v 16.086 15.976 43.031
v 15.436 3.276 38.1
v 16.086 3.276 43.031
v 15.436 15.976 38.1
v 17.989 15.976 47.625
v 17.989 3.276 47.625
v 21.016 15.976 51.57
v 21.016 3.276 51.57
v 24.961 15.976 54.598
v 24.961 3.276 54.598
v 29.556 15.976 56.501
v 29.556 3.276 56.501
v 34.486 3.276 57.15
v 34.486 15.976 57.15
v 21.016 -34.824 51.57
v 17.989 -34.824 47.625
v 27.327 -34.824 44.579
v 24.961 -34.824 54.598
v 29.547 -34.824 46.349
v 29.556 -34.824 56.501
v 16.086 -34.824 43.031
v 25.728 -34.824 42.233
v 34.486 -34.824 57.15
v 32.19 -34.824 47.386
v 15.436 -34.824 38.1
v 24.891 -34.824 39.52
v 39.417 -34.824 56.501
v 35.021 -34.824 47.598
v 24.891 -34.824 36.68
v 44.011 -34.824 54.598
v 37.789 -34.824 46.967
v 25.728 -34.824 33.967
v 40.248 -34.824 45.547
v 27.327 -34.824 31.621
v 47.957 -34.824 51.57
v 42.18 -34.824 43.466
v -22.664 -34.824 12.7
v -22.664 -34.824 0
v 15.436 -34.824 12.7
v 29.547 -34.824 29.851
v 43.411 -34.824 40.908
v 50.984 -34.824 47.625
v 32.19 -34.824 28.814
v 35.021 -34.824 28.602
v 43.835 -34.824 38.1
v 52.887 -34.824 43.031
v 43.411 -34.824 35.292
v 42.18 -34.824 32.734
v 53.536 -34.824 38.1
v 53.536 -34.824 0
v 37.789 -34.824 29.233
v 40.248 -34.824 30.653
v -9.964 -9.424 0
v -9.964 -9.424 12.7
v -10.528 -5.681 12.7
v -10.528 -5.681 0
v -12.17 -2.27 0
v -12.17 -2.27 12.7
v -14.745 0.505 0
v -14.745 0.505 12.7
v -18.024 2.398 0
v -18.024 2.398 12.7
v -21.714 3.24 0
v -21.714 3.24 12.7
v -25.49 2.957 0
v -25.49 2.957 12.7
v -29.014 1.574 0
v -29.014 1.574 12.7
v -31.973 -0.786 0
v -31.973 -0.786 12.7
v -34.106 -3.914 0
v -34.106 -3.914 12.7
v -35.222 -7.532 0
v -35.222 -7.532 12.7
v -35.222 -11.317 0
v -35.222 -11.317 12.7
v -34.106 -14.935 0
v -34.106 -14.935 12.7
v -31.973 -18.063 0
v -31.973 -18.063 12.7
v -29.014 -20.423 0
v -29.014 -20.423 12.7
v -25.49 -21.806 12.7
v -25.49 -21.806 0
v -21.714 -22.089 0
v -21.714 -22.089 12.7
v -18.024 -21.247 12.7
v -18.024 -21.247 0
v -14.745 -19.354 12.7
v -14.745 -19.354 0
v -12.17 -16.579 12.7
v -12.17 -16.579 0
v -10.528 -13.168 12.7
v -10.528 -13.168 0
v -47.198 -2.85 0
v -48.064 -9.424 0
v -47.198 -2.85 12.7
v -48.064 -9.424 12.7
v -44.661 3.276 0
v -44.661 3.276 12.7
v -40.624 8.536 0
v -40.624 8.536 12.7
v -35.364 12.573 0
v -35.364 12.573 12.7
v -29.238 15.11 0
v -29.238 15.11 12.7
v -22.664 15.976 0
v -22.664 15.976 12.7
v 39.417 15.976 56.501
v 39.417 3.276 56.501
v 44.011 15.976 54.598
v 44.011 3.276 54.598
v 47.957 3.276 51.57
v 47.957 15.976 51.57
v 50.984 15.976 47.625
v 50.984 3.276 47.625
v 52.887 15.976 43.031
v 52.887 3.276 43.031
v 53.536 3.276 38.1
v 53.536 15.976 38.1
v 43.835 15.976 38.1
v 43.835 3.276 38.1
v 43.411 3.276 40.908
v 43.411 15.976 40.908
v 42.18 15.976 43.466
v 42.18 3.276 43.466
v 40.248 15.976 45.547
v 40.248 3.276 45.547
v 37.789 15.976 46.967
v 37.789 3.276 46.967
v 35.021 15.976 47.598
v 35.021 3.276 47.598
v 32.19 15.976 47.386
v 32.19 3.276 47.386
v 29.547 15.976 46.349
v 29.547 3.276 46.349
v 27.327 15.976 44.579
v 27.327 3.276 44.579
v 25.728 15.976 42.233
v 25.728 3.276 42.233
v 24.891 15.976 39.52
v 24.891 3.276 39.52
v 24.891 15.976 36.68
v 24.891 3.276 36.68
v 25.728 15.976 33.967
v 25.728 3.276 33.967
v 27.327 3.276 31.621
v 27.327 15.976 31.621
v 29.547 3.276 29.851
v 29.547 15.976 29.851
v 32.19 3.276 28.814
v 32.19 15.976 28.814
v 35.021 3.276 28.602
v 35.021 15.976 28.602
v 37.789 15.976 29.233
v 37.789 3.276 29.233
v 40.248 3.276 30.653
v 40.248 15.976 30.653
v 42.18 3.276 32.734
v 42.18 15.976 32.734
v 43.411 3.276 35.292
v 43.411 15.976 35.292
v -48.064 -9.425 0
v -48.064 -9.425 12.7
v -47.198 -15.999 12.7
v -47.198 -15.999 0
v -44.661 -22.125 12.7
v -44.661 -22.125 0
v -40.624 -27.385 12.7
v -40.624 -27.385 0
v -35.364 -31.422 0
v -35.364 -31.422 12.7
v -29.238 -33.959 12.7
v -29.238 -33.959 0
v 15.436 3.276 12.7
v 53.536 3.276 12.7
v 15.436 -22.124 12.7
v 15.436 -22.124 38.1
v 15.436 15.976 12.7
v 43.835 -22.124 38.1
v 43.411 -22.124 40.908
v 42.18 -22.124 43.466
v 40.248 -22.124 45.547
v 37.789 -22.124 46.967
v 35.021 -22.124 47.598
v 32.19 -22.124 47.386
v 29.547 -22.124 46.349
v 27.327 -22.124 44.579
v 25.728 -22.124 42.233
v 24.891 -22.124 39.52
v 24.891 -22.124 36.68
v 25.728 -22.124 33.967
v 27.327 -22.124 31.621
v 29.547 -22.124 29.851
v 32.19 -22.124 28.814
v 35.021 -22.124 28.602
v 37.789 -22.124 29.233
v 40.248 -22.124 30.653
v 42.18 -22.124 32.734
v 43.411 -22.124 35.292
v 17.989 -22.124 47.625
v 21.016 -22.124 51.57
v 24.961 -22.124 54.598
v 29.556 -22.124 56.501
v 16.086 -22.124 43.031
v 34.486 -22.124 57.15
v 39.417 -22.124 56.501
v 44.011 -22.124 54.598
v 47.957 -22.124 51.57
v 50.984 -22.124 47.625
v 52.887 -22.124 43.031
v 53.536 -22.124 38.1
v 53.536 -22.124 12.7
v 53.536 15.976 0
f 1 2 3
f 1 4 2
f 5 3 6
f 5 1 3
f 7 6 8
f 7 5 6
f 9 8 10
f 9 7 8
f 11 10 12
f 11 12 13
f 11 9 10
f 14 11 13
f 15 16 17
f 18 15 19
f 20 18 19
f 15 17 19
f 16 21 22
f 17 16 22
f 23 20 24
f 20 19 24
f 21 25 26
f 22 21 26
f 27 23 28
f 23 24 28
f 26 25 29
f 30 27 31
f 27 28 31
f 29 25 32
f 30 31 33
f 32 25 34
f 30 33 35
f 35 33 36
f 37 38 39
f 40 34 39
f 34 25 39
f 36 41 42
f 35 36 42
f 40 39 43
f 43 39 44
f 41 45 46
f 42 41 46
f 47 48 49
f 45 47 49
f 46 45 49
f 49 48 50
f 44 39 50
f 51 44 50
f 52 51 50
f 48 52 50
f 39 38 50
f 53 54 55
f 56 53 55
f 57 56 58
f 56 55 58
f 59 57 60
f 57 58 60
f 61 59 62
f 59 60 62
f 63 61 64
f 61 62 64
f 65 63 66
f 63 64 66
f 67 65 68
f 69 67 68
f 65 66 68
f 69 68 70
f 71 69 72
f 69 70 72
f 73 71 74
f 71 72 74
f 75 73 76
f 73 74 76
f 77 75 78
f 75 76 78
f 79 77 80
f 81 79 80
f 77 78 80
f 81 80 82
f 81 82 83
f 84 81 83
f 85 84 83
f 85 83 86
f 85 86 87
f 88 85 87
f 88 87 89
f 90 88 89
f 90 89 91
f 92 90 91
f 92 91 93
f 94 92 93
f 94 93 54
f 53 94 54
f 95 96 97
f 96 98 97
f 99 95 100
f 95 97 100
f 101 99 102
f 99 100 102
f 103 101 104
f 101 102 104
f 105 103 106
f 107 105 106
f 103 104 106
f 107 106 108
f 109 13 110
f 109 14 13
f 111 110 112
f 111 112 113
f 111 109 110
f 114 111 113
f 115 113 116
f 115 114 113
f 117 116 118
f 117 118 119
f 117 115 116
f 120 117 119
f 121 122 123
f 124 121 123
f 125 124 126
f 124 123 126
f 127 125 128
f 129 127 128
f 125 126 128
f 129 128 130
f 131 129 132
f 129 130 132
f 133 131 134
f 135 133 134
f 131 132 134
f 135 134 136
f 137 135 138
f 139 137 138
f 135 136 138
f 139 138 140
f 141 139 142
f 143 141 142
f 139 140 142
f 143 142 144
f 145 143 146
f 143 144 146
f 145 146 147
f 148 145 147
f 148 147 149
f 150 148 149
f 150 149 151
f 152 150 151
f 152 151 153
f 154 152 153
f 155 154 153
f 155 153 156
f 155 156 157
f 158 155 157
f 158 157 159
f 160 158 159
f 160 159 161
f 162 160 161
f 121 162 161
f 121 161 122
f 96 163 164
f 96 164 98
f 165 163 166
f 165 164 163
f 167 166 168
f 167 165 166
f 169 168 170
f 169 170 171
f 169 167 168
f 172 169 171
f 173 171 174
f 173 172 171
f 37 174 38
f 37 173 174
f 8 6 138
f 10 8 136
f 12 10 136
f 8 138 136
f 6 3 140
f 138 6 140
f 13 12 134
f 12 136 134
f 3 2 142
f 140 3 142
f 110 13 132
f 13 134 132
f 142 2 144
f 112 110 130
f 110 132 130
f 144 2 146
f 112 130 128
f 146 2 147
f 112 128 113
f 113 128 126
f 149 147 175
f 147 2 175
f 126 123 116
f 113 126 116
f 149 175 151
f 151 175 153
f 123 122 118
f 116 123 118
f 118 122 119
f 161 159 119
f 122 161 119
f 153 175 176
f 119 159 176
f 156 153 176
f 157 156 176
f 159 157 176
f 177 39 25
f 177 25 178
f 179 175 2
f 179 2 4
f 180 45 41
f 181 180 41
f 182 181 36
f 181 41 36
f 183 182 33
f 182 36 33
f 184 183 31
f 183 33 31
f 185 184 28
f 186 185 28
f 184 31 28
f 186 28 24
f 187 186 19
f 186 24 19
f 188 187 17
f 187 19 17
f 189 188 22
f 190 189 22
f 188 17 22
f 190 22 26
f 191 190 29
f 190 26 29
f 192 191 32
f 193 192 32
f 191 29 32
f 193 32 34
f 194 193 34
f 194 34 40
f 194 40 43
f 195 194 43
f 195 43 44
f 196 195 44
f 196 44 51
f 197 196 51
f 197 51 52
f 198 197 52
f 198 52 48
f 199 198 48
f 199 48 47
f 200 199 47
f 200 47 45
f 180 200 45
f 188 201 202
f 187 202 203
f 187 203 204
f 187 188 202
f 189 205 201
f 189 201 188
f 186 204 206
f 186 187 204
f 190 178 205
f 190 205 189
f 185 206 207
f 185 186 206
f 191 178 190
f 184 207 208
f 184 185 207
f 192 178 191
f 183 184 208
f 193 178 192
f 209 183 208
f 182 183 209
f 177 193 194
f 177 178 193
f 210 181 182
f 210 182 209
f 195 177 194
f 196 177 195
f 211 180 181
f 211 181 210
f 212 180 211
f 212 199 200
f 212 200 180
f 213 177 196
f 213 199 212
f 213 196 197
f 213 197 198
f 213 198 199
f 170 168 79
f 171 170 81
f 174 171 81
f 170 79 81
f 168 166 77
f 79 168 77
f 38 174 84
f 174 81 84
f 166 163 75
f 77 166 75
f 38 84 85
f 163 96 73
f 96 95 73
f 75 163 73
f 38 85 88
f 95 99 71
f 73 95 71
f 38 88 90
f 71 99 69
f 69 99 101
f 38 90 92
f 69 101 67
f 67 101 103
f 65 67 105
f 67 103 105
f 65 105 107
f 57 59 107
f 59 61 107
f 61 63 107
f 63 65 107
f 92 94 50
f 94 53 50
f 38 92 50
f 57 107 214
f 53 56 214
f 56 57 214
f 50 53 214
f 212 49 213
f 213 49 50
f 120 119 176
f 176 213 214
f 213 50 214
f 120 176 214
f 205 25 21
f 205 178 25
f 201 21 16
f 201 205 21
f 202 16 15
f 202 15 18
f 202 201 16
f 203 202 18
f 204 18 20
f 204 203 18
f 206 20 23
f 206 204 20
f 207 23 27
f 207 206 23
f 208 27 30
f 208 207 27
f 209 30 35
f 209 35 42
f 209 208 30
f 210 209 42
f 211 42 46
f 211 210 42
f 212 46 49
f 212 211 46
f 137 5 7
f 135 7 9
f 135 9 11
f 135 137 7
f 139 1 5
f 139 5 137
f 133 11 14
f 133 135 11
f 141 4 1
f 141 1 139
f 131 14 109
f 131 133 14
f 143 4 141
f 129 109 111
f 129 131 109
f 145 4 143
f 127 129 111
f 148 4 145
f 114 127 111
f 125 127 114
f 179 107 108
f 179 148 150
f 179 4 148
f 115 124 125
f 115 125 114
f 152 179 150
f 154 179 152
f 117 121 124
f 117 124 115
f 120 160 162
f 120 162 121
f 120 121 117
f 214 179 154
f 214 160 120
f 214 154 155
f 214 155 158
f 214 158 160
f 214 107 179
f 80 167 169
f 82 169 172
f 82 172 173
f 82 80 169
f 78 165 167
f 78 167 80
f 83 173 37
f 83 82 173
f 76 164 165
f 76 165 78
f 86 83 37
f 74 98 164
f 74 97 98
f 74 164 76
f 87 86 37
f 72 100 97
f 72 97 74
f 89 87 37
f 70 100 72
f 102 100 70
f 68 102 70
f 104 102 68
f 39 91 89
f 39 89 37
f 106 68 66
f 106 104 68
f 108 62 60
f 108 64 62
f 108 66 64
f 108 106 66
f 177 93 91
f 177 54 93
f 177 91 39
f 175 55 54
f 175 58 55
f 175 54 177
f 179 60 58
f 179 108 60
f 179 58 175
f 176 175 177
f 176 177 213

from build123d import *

# Parameters (mm, degrees)
F0_W      = 101.6
F0_H      = 50.8
F1_DEPTH  = 12.7
F2_R      = 25.39999
F3_R      = 12.7
F4_DEPTH  = 12.701
F5_W      = 38.1
F5_H      = 12.7
F6_DEPTH  = 44.45
F7_R      = 19.04999
F8_W      = 38.1
F8_H      = 12.7
F9_DEPTH  = 44.45
F10_R     = 19.04999
F11_R     = 9.525
F12_DEPTH = 50.801


# Not quite as in the source:
# - a fillet or chamfer is up to 0.001 mm smaller than in the source, because OpenCascade refuses the exact size


with BuildPart() as f1:
    # F0 (on Top) → F1 (new body)
    with BuildSketch(Plane.XY):
        with Locations((2.7364386797, -9.4244979978)):
            Rectangle(F0_W, F0_H)
    extrude(amount=F1_DEPTH)

    # F2 (radius 25.4 in the source; OpenCascade refuses exactly that, so slightly less here)
    f2_edges = [f1.edges().sort_by_distance(p)[0] for p in [
        (-48.063561, 15.975502, 6.35),
        (-48.063561, -34.824498, 6.35),
    ]]
    fillet(f2_edges, radius=F2_R)

    # F3 (on face) → F4 (cut, through all)
    with BuildSketch(Plane.XY.offset(12.7)):
        with Locations((-22.6635613203, -9.4244979978)):
            Circle(F3_R)
    extrude(amount=-F4_DEPTH, mode=Mode.SUBTRACT)

    # F5 (on face) → F6 (join)
    with BuildSketch(Plane.XY.offset(12.7)):
        with Locations((34.4864386797, -28.4744979978)):
            Rectangle(F5_W, F5_H)
    extrude(amount=F6_DEPTH)

    # F7 (radius 19.05 in the source; OpenCascade refuses exactly that, so slightly less here)
    f7_edges = [f1.edges().sort_by_distance(p)[0] for p in [
        (15.436439, -28.474498, 57.15),
        (53.536439, -28.474498, 57.15),
    ]]
    fillet(f7_edges, radius=F7_R)

    # F8 (on face) → F9 (join)
    with BuildSketch(Plane.XY.offset(12.7)):
        with Locations((34.4864386797, 9.6255020022)):
            Rectangle(F8_W, F8_H)
    extrude(amount=F9_DEPTH)

    # F10 (radius 19.05 in the source; OpenCascade refuses exactly that, so slightly less here)
    f10_edges = [f1.edges().sort_by_distance(p)[0] for p in [
        (15.436439, 9.625502, 57.15),
        (53.536439, 9.625502, 57.15),
    ]]
    fillet(f10_edges, radius=F10_R)

    # F11 (on face) → F12 (cut, through all)
    with BuildSketch(Plane.XZ.offset(34.8244979978)):
        with Locations((34.3096069992, 38.1)):
            Circle(F11_R)
    extrude(amount=-F12_DEPTH, mode=Mode.SUBTRACT)


solid = f1.part
